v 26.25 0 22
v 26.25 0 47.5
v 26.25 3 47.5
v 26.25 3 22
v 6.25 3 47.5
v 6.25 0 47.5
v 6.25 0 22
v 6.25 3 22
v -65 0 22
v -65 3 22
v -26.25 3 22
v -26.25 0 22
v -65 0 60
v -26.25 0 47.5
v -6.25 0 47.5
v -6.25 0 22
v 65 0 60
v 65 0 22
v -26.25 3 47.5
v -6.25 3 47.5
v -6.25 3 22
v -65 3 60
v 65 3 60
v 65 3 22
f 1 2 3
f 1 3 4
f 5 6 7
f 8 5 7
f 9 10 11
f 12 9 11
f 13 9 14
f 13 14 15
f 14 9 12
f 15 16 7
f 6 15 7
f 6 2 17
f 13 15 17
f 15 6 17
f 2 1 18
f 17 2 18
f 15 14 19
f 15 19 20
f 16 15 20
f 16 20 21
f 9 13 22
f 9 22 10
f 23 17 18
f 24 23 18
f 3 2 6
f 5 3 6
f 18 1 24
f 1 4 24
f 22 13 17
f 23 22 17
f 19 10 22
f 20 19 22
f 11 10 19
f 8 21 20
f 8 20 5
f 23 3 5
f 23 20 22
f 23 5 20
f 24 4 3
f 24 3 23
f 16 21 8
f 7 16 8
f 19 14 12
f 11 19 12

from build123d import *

# Parameters (mm, degrees)
SKETCH1_W               = 130
SKETCH1_H               = 120
BOSS_EXTRUDE1_DEPTH     = 3
CUT_EXTRUDE1_START      = -4
SKETCH2_W               = 20
SKETCH2_H               = 95
CUT_EXTRUDE1_DEPTH      = 5
CUT_EXTRUDE2_START      = -4
SKETCH3_R               = 1.6
CUT_EXTRUDE2_DEPTH      = 5
SKETCH4_W               = 130
SKETCH4_H               = 82
CUT_EXTRUDE3_DEPTH      = 1
CUT_EXTRUDE3_DEPTH_BACK = 4


with BuildPart() as part:
    # Sketch1 → Boss-Extrude1 (new body)
    with BuildSketch(Plane(origin=(0, 0, 0), x_dir=(1, 0, 0), z_dir=(0, 1, 0))):
        Rectangle(SKETCH1_W, SKETCH1_H)
    extrude(amount=BOSS_EXTRUDE1_DEPTH)

    # Sketch2 → Cut-Extrude1 (cut)
    with BuildSketch(Plane(origin=(0, 3, 0), x_dir=(1, 0, 0), z_dir=(0, 1, 0)).offset(CUT_EXTRUDE1_START)):
        with Locations((-16.25, 0)):
            Rectangle(SKETCH2_W, SKETCH2_H)
    cut_extrude1 = extrude(amount=CUT_EXTRUDE1_DEPTH, mode=Mode.SUBTRACT)

    # Mirror1: Cut-Extrude1 across plane
    add(cut_extrude1.mirror(Plane(origin=(0, 0, 0), x_dir=(0, 0, 1), z_dir=(1, 0, 0))), mode=Mode.SUBTRACT)

    # Sketch3 → Cut-Extrude2 (cut)
    with BuildSketch(Plane(origin=(0, 3, 0), x_dir=(1, 0, 0), z_dir=(0, 1, 0)).offset(CUT_EXTRUDE2_START)):
        with Locations((44.5, 0)):
            Circle(SKETCH3_R)
    cut_extrude2 = extrude(amount=CUT_EXTRUDE2_DEPTH, mode=Mode.SUBTRACT)

    # Mirror2: Cut-Extrude2 across plane
    add(cut_extrude2.mirror(Plane(origin=(0, 0, 0), x_dir=(0, 0, 1), z_dir=(1, 0, 0))), mode=Mode.SUBTRACT)

    # Sketch4 → Cut-Extrude3 (cut, two sides)
    with BuildSketch(Plane(origin=(0, 3, 0), x_dir=(1, 0, 0), z_dir=(0, 1, 0))) as cut_extrude3_sk:
        with Locations((0, 19)):
            Rectangle(SKETCH4_W, SKETCH4_H)
    extrude(amount=CUT_EXTRUDE3_DEPTH, mode=Mode.SUBTRACT)
    extrude(cut_extrude3_sk.sketch, amount=-CUT_EXTRUDE3_DEPTH_BACK, mode=Mode.SUBTRACT)


solid = part.part
